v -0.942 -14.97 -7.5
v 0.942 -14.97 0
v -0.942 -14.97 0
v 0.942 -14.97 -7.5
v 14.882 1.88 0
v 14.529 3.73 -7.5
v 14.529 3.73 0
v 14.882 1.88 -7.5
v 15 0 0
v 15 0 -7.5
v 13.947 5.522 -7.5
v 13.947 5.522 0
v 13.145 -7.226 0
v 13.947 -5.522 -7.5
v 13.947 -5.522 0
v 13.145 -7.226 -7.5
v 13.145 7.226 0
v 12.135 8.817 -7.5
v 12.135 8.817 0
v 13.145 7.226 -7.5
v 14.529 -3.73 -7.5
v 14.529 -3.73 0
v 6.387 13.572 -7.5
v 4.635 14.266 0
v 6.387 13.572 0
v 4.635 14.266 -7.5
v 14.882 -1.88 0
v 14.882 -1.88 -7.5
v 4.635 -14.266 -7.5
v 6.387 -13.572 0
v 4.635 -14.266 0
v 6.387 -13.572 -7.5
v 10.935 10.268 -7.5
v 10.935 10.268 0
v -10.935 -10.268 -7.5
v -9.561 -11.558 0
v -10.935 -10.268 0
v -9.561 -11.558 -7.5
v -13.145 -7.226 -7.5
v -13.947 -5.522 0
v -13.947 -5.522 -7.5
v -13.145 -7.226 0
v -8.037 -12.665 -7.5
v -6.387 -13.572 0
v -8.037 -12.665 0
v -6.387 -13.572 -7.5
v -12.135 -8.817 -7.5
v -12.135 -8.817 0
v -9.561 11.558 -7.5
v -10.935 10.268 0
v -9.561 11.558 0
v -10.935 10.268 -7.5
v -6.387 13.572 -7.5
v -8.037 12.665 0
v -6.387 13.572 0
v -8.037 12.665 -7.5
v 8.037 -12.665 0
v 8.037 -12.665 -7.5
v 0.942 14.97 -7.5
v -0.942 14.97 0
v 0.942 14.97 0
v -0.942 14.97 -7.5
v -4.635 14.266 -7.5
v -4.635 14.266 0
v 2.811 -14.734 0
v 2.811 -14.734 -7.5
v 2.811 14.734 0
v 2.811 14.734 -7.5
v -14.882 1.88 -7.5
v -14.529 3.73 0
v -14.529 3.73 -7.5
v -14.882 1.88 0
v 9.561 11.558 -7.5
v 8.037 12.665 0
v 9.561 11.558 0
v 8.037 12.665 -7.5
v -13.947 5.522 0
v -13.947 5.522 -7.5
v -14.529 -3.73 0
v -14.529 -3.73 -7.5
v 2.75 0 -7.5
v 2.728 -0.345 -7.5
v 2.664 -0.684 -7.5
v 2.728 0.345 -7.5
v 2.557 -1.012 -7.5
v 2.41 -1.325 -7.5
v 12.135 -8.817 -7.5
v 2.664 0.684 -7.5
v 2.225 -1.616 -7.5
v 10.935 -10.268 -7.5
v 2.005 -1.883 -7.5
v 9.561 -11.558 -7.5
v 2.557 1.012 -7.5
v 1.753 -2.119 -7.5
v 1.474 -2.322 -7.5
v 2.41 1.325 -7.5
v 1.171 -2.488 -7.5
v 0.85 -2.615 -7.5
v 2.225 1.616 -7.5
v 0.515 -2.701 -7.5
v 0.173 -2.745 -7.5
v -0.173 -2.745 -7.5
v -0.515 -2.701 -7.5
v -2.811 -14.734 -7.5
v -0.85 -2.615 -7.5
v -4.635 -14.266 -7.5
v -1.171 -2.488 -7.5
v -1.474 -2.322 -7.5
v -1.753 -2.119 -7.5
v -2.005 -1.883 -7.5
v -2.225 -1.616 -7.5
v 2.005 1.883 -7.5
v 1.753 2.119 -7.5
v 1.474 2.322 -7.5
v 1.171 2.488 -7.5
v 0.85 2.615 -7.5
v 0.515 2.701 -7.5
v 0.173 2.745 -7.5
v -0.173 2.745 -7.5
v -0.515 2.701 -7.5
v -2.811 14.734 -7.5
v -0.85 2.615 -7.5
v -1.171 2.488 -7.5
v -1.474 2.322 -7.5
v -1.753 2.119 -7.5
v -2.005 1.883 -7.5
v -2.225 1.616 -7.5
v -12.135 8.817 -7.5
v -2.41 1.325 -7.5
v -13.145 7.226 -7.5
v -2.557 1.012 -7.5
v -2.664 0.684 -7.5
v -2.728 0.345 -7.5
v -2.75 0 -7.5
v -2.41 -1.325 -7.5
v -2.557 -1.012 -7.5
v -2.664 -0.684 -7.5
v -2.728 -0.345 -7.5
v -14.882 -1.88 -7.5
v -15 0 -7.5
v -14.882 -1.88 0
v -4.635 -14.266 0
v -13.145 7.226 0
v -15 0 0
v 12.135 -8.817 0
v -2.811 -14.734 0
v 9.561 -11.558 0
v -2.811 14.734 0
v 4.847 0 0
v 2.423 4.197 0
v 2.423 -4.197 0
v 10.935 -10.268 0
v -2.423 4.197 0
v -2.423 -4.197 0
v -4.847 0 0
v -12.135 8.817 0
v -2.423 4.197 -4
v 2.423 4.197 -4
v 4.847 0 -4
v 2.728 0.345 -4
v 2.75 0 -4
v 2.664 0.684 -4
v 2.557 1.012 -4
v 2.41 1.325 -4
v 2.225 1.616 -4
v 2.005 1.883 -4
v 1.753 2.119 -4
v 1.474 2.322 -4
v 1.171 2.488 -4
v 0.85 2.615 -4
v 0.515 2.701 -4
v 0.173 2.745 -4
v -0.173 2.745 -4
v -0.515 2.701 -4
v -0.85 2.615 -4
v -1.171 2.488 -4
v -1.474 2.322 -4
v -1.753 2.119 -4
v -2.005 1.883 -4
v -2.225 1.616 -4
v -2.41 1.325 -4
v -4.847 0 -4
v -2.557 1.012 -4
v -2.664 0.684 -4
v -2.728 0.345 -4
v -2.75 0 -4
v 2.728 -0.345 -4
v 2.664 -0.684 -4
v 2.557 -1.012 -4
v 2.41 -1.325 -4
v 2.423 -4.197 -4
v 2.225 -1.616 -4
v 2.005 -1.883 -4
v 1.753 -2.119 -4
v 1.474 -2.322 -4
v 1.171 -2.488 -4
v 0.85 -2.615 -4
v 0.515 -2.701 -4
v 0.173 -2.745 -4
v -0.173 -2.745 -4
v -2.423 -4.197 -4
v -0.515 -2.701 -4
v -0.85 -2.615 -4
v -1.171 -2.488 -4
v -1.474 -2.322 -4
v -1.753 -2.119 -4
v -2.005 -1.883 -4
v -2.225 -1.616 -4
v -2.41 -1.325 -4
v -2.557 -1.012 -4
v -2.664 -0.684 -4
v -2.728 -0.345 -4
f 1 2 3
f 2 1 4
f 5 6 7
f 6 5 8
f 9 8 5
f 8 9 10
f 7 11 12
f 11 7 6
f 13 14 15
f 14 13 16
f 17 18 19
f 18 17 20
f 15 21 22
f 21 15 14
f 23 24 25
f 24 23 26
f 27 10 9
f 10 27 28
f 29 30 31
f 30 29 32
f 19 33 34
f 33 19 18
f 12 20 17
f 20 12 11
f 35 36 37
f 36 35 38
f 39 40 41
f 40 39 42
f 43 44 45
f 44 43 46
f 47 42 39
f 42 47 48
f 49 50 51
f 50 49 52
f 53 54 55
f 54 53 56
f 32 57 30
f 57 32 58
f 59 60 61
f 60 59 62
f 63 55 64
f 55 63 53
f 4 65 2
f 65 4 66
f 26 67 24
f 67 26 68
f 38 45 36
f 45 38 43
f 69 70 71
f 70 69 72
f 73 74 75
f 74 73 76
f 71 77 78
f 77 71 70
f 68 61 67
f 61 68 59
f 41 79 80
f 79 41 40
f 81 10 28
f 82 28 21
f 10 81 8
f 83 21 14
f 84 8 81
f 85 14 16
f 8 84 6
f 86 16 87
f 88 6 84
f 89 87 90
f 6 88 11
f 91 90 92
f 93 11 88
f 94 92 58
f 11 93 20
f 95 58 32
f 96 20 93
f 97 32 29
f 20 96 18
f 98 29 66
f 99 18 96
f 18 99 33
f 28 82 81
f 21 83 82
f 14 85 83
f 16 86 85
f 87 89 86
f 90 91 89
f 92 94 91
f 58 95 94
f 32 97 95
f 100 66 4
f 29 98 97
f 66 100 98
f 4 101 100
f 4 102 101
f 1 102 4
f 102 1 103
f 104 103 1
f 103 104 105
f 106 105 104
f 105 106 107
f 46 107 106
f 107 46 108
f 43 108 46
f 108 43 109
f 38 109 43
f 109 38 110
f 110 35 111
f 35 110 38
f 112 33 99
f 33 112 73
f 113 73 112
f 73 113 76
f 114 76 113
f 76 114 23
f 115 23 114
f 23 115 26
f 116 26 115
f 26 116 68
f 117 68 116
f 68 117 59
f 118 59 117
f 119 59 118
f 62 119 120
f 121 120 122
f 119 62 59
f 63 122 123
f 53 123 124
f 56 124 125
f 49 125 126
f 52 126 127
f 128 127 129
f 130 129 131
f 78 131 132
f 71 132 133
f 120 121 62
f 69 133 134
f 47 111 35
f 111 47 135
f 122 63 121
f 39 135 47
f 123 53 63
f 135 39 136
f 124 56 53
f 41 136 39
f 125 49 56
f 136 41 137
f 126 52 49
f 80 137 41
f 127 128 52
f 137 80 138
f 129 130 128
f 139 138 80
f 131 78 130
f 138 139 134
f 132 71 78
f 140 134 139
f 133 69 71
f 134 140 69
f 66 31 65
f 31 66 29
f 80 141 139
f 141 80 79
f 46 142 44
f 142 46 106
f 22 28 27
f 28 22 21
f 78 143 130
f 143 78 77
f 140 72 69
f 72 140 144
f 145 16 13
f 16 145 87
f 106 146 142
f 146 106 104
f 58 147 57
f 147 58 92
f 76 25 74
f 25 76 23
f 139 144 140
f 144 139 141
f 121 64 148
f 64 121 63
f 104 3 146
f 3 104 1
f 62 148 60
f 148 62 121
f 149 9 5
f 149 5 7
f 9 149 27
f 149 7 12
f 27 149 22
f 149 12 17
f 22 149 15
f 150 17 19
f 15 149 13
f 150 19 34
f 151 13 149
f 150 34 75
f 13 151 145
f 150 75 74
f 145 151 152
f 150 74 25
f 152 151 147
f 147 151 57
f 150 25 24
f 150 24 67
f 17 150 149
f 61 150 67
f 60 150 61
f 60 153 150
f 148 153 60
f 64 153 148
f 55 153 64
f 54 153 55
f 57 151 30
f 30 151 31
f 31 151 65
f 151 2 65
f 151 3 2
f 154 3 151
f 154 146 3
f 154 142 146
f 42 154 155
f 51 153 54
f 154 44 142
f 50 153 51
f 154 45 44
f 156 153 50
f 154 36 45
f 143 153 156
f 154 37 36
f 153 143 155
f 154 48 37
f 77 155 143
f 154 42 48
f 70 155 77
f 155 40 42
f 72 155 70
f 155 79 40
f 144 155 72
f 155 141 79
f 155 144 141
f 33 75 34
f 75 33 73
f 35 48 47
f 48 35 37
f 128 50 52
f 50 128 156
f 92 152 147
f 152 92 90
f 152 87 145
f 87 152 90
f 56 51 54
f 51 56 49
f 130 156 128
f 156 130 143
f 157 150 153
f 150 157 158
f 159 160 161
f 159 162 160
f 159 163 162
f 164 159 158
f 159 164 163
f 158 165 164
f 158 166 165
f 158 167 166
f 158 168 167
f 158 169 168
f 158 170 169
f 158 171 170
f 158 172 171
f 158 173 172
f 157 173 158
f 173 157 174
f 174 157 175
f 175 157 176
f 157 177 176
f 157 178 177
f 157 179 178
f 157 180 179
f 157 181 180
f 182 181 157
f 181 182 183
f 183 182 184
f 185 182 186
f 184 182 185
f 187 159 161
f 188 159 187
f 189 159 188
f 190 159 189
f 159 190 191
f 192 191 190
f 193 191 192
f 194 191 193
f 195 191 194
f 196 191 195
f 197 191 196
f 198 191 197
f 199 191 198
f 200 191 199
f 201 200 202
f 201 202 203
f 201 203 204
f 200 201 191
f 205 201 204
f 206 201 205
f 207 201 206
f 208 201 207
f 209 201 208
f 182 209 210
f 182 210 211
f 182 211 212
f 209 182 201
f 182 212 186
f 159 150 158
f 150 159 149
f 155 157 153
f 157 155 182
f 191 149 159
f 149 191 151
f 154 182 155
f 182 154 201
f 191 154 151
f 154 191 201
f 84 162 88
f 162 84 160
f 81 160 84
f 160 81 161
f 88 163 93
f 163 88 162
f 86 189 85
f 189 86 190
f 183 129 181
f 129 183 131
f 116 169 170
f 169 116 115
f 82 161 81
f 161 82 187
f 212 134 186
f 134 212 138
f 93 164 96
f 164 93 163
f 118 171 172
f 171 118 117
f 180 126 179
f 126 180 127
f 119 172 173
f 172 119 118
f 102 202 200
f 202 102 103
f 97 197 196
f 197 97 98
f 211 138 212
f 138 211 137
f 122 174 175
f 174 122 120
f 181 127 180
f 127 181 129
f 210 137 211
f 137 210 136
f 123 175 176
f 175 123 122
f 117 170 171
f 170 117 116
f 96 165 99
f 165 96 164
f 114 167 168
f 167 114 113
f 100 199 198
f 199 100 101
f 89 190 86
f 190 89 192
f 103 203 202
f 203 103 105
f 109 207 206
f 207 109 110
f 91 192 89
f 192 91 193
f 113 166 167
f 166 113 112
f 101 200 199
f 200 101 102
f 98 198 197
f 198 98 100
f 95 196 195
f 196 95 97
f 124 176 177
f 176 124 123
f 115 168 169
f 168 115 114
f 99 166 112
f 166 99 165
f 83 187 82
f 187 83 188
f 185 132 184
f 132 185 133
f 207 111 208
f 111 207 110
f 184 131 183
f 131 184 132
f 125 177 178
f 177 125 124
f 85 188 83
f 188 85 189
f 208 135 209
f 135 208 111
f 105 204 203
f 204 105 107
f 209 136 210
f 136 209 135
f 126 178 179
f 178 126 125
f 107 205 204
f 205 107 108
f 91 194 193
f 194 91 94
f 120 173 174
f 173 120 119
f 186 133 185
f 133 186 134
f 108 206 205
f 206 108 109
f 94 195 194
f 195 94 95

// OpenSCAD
$fn = 50;


difference() {
	union() {
		translate(v = [0, 0, -7.5000000000]) {
			cylinder(h = 7.5000000000, r = 15.0000000000);
		}
		translate(v = [0, 0, -6.0000000000]) {
			cylinder(h = 6, r = 2.8750000000);
		}
	}
	union() {
		translate(v = [0, 0, 0]) {
			rotate(a = [0, 0, 0]) {
				difference() {
					union() {
						translate(v = [0, 0, -4]) {
							linear_extrude(height = 4) {
								polygon(points = [[4.8468000000, 0.0000000000], [2.4234000000, 4.1974519271], [-2.4234000000, 4.1974519271], [-4.8468000000, 0.0000000000], [-2.4234000000, -4.1974519271], [2.4234000000, -4.1974519271]]);
							}
						}
					}
					union();
				}
			}
		}
		#translate(v = [0, 0, -100.0000000000]) {
			cylinder(h = 200, r = 2.7500000000);
		}
	}
}
